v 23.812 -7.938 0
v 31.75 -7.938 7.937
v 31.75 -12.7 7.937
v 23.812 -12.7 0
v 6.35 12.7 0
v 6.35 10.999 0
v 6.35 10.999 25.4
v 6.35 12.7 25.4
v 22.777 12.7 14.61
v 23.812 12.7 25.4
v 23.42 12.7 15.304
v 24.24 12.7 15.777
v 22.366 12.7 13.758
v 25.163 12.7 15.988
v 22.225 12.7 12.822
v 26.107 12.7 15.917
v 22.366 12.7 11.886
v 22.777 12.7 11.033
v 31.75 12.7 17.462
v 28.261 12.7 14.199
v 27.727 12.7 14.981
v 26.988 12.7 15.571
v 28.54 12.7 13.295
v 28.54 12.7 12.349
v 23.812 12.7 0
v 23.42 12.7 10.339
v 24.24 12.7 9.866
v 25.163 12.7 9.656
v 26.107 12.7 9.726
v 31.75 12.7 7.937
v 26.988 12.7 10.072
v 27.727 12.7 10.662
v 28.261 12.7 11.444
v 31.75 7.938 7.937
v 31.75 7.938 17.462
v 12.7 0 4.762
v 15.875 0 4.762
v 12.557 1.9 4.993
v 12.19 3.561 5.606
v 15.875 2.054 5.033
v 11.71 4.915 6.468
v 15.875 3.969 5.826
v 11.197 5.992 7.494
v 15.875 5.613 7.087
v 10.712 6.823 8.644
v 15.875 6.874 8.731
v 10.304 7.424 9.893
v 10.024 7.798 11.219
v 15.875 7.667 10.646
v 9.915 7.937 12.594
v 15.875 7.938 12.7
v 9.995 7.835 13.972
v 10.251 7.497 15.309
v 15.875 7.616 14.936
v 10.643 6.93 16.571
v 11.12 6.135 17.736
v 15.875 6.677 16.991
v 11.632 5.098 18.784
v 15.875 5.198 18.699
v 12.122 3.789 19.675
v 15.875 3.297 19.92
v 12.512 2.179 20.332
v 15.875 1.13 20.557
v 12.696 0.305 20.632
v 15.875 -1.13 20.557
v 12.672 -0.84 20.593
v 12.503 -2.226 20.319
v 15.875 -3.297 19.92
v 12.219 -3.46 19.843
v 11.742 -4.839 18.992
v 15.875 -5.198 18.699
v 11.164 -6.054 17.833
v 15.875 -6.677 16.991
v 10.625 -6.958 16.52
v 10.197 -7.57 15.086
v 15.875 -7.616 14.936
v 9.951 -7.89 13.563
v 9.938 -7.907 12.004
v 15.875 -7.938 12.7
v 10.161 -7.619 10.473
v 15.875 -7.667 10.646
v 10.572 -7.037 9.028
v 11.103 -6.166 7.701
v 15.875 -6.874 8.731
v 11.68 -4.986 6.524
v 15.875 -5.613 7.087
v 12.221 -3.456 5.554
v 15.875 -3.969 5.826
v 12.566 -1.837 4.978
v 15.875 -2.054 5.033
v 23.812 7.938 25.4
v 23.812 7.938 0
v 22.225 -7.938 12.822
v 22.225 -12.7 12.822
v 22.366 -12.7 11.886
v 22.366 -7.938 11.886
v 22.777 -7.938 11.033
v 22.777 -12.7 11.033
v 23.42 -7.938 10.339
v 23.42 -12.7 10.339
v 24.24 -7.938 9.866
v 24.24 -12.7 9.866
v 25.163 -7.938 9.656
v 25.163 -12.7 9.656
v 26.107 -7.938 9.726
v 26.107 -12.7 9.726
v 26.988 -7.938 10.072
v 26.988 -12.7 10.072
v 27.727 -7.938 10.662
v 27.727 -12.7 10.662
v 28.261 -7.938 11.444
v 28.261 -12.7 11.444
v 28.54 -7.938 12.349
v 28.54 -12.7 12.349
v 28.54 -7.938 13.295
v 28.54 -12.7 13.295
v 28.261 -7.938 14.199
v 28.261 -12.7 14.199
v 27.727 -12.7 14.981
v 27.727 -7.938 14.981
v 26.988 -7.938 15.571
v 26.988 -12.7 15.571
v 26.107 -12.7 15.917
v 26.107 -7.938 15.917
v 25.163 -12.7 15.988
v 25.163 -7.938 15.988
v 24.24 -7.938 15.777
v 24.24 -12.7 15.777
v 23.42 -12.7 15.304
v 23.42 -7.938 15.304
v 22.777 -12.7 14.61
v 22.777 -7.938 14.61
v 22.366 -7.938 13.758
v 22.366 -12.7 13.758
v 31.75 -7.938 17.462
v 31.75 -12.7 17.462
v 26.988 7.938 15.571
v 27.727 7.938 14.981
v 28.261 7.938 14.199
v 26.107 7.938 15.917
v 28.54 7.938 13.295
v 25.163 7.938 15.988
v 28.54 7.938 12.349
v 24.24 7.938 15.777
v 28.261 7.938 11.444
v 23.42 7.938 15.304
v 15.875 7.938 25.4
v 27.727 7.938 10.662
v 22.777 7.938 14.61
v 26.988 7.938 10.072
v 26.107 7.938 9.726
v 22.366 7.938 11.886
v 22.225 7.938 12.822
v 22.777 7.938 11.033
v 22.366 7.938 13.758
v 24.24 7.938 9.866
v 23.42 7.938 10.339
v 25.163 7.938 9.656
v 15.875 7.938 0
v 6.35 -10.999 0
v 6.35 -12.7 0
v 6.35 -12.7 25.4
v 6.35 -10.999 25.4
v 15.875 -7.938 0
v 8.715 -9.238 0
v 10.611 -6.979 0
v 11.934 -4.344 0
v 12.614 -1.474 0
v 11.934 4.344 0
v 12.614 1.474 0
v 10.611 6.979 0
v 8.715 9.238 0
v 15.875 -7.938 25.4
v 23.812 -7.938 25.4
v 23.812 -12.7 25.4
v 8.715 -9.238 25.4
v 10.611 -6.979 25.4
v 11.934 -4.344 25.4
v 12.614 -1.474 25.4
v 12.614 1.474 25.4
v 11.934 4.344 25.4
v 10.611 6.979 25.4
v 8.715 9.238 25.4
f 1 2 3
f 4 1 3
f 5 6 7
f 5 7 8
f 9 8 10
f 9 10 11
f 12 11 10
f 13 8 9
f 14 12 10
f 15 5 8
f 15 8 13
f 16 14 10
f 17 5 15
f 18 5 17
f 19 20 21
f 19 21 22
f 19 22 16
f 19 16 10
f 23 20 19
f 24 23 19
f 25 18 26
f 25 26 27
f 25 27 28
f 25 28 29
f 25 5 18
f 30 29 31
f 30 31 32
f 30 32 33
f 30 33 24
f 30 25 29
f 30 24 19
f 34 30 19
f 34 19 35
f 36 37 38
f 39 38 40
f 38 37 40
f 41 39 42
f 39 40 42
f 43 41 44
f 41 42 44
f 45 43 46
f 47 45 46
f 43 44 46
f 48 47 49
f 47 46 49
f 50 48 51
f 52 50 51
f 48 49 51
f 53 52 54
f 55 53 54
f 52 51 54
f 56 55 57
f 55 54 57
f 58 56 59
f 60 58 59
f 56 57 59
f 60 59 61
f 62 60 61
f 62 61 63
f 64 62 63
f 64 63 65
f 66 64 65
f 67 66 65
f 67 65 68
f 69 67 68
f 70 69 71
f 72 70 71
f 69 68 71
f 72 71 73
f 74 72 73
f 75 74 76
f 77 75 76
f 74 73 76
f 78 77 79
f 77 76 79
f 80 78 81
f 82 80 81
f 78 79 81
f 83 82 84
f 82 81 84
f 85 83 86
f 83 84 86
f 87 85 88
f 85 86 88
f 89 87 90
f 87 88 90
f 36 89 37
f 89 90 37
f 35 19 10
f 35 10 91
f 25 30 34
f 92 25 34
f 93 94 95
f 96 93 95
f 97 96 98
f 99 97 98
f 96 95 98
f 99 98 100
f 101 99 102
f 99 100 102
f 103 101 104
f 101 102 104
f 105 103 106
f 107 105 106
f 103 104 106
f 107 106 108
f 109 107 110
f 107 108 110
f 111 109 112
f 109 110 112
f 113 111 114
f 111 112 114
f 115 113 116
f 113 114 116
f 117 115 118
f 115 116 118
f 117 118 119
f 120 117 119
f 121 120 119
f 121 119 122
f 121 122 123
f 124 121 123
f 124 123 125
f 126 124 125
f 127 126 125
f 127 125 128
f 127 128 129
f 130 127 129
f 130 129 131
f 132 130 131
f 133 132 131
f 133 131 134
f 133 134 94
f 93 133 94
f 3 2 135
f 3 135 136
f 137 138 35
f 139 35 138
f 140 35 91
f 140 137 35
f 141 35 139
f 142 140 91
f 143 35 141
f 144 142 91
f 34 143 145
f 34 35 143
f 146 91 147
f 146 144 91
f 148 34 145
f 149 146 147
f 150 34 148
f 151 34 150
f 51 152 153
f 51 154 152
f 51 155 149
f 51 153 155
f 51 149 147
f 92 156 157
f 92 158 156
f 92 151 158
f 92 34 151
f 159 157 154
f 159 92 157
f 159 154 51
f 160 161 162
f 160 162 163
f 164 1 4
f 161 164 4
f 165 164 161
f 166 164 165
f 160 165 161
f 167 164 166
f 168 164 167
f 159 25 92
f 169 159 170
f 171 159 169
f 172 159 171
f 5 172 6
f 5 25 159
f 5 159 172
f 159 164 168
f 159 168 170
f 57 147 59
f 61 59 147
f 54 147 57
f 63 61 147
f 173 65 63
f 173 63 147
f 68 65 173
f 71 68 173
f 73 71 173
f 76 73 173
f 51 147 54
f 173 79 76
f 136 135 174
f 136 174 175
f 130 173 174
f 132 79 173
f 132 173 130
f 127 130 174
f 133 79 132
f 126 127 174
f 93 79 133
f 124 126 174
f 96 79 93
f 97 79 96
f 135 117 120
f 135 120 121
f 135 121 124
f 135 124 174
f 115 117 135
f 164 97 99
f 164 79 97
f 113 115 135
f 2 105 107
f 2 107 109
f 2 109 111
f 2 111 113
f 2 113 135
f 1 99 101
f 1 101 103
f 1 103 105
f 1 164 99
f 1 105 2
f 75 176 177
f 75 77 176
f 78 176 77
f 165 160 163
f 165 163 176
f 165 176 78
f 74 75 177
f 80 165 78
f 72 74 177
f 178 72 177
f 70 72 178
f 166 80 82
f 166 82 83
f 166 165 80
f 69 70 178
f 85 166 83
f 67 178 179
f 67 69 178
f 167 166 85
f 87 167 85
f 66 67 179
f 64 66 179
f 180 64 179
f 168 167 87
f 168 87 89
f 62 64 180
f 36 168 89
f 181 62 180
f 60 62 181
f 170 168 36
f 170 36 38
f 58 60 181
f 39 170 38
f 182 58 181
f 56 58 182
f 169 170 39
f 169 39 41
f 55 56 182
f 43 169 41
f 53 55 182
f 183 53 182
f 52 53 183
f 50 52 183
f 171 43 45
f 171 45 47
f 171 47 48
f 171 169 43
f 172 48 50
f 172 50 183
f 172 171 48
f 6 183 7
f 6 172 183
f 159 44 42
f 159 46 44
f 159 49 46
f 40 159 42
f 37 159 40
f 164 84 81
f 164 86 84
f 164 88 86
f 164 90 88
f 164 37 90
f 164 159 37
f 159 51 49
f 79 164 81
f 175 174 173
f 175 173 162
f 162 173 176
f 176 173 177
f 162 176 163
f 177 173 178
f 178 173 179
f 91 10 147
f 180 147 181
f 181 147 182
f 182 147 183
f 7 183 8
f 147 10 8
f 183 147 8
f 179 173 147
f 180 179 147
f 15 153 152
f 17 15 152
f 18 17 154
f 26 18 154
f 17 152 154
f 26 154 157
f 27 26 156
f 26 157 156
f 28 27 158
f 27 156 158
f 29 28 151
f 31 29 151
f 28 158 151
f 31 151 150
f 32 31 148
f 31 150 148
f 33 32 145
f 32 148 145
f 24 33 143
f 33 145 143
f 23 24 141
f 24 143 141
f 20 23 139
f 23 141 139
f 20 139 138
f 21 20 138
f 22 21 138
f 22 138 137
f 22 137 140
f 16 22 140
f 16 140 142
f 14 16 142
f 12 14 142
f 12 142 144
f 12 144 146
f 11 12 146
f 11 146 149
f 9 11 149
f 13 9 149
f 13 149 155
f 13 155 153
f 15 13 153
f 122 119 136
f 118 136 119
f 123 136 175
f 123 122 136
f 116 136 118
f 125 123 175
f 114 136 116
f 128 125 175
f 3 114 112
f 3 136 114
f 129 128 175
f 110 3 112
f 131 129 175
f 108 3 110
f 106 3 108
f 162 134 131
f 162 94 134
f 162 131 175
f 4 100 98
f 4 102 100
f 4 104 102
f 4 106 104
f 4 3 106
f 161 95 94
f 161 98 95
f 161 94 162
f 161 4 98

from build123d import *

# Parameters (mm, degrees)
BOSS_EXTRUDE1_DEPTH         = 25.4
F_1_4_0_25_DIAMETER_HOLE1_D = 6.35
CHAMFER1_SIZE               = 7.9375
SKETCH6_R                   = 7.9375
CUT_EXTRUDE1_DEPTH          = 10.525


with BuildPart() as part:
    # Sketch1 → Boss-Extrude1 (new body)
    with BuildSketch(Plane.XY):
        with BuildLine():
            Line((6.35, 12.7), (31.75, 12.7))
            Line((31.75, 12.7), (31.75, 7.9375))
            Line((31.75, 7.9375), (15.875, 7.9375))
            Line((15.875, 7.9375), (15.875, -7.9375))
            Line((15.875, -7.9375), (31.75, -7.9375))
            Line((31.75, -7.9375), (31.75, -12.7))
            Line((31.75, -12.7), (6.35, -12.7))
            Line((6.35, -12.7), (6.35, -10.998522628))
            ThreePointArc((6.35, -10.998522628), (12.7, 0), (6.35, 10.998522628))
            Line((6.35, 10.998522628), (6.35, 12.7))
        make_face()
    extrude(amount=BOSS_EXTRUDE1_DEPTH)

    # 1/4 (0.25) Diameter Hole1 (through all)
    with Locations(Plane(origin=(0, 12.7, 0), x_dir=(1, 0, 0), z_dir=(0, 1, 0))):
        with Locations((25.4, -12.821774192)):
            Hole(F_1_4_0_25_DIAMETER_HOLE1_D / 2)

    # Chamfer1
    chamfer1_edges = [part.edges().sort_by_distance(p)[0] for p in [
        (31.75, 10.31875, 0),
        (31.75, 10.31875, 25.4),
        (31.75, -10.31875, 25.4),
        (31.75, -10.31875, 0),
    ]]
    chamfer(chamfer1_edges, length=CHAMFER1_SIZE)

    # Sketch6 → Cut-Extrude1 (cut, through all)
    with BuildSketch(Plane(origin=(15.875, 0, 0), x_dir=(0, 0, -1), z_dir=(1, 0, 0))):
        with Locations((-12.7, 0)):
            Circle(SKETCH6_R)
    extrude(amount=-CUT_EXTRUDE1_DEPTH, mode=Mode.SUBTRACT)


solid = part.part
